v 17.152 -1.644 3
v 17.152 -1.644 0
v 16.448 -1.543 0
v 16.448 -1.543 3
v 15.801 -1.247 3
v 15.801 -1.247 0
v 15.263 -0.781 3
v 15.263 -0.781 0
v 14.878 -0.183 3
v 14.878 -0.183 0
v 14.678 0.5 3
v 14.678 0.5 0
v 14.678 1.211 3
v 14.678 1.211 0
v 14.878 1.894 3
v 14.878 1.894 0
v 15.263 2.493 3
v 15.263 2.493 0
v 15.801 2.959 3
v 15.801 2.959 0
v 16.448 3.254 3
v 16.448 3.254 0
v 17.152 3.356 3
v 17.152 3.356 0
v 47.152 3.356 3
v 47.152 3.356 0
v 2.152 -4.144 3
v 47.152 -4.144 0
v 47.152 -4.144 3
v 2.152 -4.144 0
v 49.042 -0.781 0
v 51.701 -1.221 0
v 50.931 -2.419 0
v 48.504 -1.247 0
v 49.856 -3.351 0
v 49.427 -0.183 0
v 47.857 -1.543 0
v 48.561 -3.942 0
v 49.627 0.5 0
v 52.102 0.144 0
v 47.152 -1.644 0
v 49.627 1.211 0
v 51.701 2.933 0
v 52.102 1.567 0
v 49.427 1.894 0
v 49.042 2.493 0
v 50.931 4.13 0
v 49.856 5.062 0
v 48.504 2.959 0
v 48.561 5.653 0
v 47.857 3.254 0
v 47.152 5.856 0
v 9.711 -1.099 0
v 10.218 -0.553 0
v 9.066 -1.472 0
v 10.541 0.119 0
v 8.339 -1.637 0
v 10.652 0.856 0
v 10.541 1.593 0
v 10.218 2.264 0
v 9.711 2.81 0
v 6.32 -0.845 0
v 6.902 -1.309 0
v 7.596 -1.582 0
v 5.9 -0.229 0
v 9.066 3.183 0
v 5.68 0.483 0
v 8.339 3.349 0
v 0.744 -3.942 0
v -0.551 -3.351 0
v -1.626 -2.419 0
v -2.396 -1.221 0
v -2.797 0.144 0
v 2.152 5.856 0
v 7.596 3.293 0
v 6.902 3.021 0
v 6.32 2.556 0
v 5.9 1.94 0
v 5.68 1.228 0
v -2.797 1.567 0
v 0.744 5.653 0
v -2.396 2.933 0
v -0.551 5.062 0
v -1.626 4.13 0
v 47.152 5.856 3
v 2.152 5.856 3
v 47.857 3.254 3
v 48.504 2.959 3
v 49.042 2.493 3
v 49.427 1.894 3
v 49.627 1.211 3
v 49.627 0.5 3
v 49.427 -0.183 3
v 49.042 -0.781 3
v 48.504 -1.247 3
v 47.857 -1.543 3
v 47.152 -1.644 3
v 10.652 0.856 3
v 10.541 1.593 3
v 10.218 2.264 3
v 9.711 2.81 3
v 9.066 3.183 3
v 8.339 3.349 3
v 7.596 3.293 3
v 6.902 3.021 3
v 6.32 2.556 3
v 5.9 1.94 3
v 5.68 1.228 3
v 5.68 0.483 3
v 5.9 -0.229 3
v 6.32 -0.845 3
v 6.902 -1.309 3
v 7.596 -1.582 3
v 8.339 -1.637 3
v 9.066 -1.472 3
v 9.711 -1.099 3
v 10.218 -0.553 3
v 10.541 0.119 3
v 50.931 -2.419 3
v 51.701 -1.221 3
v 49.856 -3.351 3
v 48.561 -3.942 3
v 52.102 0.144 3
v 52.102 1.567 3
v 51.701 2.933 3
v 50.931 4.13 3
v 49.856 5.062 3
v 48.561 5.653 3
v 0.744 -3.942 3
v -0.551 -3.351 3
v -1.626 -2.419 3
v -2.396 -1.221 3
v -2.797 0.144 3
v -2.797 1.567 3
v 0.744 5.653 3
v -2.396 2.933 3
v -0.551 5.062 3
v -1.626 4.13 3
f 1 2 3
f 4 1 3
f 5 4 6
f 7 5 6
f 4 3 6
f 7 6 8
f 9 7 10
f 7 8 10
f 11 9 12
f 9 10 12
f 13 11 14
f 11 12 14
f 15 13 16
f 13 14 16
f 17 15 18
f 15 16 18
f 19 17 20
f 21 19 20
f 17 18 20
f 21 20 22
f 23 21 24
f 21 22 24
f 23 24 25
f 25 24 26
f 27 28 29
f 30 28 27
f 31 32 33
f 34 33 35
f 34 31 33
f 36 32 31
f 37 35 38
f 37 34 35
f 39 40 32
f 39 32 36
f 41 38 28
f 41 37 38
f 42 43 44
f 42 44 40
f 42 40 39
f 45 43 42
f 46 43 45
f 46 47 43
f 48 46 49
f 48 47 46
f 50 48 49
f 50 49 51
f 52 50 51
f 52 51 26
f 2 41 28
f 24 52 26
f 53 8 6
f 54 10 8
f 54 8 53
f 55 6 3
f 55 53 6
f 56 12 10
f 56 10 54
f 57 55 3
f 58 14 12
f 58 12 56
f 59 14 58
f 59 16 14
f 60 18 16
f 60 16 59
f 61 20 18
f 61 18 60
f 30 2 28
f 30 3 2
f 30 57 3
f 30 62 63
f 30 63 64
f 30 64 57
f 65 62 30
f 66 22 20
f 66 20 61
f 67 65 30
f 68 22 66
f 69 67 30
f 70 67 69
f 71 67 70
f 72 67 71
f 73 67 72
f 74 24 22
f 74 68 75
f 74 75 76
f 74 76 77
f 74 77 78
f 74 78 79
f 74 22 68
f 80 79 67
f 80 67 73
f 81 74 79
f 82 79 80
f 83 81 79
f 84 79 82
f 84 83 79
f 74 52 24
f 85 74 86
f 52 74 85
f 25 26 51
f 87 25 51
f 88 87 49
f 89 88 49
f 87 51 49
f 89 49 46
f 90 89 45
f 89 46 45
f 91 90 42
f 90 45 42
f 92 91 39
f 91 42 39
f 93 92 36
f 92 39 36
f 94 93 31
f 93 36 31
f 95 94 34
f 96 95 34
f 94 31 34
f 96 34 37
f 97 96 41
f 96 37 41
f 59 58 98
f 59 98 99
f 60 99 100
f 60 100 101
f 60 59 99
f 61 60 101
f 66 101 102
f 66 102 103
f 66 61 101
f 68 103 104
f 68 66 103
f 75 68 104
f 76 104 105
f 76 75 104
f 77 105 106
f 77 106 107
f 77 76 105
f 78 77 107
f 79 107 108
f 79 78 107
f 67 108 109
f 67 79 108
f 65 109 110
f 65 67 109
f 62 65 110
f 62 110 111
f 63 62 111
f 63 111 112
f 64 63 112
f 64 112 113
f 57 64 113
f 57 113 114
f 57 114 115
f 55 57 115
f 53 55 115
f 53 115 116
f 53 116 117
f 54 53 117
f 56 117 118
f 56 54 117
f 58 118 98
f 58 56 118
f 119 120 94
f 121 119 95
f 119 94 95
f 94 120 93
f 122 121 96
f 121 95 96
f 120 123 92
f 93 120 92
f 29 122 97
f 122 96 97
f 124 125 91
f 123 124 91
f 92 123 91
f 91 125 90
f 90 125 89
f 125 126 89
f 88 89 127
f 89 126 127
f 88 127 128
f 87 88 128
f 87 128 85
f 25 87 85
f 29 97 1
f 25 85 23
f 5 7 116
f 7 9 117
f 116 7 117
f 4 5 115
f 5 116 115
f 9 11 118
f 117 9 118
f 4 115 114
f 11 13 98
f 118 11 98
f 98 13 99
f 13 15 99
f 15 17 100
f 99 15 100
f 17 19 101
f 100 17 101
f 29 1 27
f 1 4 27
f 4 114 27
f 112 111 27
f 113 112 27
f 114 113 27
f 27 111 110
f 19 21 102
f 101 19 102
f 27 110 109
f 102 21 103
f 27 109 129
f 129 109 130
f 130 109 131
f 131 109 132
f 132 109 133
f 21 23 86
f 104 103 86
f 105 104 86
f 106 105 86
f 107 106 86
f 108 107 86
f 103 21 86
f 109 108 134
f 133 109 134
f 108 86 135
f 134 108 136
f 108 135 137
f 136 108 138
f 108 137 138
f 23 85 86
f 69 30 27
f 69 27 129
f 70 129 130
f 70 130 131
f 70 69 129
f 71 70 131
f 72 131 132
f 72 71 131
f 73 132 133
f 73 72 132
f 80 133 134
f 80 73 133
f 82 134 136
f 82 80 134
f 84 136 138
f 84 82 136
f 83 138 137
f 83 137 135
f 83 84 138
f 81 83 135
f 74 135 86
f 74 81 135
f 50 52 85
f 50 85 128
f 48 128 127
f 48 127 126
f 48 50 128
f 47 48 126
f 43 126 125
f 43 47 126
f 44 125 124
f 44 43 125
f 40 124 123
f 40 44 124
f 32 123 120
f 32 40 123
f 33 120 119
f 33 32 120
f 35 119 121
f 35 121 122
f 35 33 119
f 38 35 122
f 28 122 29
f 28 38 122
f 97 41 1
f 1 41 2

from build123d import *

# Parameters (mm, degrees)
SKETCH2_R           = 2.5
BOSS_EXTRUDE1_DEPTH = 3


with BuildPart() as part:
    # Sketch2 → Boss-Extrude1 (new body)
    with BuildSketch(Plane.XY):
        with BuildLine():
            Line((2.152494721, 5.855657737), (47.152494721, 5.855657737))
            ThreePointArc((47.152494721, 5.855657737), (52.152494721, 0.855657737), (47.152494721, -4.144342263))
            Line((47.152494721, -4.144342263), (2.152494721, -4.144342263))
            ThreePointArc((2.152494721, -4.144342263), (-2.847505279, 0.855657737), (2.152494721, 5.855657737))
        make_face()
        with Locations((8.152494721, 0.855657737)):
            Circle(SKETCH2_R, mode=Mode.SUBTRACT)
        with BuildLine():
            Line((17.152494721, 3.355657737), (47.152494721, 3.355657737))
            ThreePointArc((47.152494721, 3.355657737), (49.652494721, 0.855657737), (47.152494721, -1.644342263))
            Line((47.152494721, -1.644342263), (17.152494721, -1.644342263))
            ThreePointArc((17.152494721, -1.644342263), (14.652494721, 0.855657737), (17.152494721, 3.355657737))
        make_face(mode=Mode.SUBTRACT)
    extrude(amount=BOSS_EXTRUDE1_DEPTH)


solid = part.part
